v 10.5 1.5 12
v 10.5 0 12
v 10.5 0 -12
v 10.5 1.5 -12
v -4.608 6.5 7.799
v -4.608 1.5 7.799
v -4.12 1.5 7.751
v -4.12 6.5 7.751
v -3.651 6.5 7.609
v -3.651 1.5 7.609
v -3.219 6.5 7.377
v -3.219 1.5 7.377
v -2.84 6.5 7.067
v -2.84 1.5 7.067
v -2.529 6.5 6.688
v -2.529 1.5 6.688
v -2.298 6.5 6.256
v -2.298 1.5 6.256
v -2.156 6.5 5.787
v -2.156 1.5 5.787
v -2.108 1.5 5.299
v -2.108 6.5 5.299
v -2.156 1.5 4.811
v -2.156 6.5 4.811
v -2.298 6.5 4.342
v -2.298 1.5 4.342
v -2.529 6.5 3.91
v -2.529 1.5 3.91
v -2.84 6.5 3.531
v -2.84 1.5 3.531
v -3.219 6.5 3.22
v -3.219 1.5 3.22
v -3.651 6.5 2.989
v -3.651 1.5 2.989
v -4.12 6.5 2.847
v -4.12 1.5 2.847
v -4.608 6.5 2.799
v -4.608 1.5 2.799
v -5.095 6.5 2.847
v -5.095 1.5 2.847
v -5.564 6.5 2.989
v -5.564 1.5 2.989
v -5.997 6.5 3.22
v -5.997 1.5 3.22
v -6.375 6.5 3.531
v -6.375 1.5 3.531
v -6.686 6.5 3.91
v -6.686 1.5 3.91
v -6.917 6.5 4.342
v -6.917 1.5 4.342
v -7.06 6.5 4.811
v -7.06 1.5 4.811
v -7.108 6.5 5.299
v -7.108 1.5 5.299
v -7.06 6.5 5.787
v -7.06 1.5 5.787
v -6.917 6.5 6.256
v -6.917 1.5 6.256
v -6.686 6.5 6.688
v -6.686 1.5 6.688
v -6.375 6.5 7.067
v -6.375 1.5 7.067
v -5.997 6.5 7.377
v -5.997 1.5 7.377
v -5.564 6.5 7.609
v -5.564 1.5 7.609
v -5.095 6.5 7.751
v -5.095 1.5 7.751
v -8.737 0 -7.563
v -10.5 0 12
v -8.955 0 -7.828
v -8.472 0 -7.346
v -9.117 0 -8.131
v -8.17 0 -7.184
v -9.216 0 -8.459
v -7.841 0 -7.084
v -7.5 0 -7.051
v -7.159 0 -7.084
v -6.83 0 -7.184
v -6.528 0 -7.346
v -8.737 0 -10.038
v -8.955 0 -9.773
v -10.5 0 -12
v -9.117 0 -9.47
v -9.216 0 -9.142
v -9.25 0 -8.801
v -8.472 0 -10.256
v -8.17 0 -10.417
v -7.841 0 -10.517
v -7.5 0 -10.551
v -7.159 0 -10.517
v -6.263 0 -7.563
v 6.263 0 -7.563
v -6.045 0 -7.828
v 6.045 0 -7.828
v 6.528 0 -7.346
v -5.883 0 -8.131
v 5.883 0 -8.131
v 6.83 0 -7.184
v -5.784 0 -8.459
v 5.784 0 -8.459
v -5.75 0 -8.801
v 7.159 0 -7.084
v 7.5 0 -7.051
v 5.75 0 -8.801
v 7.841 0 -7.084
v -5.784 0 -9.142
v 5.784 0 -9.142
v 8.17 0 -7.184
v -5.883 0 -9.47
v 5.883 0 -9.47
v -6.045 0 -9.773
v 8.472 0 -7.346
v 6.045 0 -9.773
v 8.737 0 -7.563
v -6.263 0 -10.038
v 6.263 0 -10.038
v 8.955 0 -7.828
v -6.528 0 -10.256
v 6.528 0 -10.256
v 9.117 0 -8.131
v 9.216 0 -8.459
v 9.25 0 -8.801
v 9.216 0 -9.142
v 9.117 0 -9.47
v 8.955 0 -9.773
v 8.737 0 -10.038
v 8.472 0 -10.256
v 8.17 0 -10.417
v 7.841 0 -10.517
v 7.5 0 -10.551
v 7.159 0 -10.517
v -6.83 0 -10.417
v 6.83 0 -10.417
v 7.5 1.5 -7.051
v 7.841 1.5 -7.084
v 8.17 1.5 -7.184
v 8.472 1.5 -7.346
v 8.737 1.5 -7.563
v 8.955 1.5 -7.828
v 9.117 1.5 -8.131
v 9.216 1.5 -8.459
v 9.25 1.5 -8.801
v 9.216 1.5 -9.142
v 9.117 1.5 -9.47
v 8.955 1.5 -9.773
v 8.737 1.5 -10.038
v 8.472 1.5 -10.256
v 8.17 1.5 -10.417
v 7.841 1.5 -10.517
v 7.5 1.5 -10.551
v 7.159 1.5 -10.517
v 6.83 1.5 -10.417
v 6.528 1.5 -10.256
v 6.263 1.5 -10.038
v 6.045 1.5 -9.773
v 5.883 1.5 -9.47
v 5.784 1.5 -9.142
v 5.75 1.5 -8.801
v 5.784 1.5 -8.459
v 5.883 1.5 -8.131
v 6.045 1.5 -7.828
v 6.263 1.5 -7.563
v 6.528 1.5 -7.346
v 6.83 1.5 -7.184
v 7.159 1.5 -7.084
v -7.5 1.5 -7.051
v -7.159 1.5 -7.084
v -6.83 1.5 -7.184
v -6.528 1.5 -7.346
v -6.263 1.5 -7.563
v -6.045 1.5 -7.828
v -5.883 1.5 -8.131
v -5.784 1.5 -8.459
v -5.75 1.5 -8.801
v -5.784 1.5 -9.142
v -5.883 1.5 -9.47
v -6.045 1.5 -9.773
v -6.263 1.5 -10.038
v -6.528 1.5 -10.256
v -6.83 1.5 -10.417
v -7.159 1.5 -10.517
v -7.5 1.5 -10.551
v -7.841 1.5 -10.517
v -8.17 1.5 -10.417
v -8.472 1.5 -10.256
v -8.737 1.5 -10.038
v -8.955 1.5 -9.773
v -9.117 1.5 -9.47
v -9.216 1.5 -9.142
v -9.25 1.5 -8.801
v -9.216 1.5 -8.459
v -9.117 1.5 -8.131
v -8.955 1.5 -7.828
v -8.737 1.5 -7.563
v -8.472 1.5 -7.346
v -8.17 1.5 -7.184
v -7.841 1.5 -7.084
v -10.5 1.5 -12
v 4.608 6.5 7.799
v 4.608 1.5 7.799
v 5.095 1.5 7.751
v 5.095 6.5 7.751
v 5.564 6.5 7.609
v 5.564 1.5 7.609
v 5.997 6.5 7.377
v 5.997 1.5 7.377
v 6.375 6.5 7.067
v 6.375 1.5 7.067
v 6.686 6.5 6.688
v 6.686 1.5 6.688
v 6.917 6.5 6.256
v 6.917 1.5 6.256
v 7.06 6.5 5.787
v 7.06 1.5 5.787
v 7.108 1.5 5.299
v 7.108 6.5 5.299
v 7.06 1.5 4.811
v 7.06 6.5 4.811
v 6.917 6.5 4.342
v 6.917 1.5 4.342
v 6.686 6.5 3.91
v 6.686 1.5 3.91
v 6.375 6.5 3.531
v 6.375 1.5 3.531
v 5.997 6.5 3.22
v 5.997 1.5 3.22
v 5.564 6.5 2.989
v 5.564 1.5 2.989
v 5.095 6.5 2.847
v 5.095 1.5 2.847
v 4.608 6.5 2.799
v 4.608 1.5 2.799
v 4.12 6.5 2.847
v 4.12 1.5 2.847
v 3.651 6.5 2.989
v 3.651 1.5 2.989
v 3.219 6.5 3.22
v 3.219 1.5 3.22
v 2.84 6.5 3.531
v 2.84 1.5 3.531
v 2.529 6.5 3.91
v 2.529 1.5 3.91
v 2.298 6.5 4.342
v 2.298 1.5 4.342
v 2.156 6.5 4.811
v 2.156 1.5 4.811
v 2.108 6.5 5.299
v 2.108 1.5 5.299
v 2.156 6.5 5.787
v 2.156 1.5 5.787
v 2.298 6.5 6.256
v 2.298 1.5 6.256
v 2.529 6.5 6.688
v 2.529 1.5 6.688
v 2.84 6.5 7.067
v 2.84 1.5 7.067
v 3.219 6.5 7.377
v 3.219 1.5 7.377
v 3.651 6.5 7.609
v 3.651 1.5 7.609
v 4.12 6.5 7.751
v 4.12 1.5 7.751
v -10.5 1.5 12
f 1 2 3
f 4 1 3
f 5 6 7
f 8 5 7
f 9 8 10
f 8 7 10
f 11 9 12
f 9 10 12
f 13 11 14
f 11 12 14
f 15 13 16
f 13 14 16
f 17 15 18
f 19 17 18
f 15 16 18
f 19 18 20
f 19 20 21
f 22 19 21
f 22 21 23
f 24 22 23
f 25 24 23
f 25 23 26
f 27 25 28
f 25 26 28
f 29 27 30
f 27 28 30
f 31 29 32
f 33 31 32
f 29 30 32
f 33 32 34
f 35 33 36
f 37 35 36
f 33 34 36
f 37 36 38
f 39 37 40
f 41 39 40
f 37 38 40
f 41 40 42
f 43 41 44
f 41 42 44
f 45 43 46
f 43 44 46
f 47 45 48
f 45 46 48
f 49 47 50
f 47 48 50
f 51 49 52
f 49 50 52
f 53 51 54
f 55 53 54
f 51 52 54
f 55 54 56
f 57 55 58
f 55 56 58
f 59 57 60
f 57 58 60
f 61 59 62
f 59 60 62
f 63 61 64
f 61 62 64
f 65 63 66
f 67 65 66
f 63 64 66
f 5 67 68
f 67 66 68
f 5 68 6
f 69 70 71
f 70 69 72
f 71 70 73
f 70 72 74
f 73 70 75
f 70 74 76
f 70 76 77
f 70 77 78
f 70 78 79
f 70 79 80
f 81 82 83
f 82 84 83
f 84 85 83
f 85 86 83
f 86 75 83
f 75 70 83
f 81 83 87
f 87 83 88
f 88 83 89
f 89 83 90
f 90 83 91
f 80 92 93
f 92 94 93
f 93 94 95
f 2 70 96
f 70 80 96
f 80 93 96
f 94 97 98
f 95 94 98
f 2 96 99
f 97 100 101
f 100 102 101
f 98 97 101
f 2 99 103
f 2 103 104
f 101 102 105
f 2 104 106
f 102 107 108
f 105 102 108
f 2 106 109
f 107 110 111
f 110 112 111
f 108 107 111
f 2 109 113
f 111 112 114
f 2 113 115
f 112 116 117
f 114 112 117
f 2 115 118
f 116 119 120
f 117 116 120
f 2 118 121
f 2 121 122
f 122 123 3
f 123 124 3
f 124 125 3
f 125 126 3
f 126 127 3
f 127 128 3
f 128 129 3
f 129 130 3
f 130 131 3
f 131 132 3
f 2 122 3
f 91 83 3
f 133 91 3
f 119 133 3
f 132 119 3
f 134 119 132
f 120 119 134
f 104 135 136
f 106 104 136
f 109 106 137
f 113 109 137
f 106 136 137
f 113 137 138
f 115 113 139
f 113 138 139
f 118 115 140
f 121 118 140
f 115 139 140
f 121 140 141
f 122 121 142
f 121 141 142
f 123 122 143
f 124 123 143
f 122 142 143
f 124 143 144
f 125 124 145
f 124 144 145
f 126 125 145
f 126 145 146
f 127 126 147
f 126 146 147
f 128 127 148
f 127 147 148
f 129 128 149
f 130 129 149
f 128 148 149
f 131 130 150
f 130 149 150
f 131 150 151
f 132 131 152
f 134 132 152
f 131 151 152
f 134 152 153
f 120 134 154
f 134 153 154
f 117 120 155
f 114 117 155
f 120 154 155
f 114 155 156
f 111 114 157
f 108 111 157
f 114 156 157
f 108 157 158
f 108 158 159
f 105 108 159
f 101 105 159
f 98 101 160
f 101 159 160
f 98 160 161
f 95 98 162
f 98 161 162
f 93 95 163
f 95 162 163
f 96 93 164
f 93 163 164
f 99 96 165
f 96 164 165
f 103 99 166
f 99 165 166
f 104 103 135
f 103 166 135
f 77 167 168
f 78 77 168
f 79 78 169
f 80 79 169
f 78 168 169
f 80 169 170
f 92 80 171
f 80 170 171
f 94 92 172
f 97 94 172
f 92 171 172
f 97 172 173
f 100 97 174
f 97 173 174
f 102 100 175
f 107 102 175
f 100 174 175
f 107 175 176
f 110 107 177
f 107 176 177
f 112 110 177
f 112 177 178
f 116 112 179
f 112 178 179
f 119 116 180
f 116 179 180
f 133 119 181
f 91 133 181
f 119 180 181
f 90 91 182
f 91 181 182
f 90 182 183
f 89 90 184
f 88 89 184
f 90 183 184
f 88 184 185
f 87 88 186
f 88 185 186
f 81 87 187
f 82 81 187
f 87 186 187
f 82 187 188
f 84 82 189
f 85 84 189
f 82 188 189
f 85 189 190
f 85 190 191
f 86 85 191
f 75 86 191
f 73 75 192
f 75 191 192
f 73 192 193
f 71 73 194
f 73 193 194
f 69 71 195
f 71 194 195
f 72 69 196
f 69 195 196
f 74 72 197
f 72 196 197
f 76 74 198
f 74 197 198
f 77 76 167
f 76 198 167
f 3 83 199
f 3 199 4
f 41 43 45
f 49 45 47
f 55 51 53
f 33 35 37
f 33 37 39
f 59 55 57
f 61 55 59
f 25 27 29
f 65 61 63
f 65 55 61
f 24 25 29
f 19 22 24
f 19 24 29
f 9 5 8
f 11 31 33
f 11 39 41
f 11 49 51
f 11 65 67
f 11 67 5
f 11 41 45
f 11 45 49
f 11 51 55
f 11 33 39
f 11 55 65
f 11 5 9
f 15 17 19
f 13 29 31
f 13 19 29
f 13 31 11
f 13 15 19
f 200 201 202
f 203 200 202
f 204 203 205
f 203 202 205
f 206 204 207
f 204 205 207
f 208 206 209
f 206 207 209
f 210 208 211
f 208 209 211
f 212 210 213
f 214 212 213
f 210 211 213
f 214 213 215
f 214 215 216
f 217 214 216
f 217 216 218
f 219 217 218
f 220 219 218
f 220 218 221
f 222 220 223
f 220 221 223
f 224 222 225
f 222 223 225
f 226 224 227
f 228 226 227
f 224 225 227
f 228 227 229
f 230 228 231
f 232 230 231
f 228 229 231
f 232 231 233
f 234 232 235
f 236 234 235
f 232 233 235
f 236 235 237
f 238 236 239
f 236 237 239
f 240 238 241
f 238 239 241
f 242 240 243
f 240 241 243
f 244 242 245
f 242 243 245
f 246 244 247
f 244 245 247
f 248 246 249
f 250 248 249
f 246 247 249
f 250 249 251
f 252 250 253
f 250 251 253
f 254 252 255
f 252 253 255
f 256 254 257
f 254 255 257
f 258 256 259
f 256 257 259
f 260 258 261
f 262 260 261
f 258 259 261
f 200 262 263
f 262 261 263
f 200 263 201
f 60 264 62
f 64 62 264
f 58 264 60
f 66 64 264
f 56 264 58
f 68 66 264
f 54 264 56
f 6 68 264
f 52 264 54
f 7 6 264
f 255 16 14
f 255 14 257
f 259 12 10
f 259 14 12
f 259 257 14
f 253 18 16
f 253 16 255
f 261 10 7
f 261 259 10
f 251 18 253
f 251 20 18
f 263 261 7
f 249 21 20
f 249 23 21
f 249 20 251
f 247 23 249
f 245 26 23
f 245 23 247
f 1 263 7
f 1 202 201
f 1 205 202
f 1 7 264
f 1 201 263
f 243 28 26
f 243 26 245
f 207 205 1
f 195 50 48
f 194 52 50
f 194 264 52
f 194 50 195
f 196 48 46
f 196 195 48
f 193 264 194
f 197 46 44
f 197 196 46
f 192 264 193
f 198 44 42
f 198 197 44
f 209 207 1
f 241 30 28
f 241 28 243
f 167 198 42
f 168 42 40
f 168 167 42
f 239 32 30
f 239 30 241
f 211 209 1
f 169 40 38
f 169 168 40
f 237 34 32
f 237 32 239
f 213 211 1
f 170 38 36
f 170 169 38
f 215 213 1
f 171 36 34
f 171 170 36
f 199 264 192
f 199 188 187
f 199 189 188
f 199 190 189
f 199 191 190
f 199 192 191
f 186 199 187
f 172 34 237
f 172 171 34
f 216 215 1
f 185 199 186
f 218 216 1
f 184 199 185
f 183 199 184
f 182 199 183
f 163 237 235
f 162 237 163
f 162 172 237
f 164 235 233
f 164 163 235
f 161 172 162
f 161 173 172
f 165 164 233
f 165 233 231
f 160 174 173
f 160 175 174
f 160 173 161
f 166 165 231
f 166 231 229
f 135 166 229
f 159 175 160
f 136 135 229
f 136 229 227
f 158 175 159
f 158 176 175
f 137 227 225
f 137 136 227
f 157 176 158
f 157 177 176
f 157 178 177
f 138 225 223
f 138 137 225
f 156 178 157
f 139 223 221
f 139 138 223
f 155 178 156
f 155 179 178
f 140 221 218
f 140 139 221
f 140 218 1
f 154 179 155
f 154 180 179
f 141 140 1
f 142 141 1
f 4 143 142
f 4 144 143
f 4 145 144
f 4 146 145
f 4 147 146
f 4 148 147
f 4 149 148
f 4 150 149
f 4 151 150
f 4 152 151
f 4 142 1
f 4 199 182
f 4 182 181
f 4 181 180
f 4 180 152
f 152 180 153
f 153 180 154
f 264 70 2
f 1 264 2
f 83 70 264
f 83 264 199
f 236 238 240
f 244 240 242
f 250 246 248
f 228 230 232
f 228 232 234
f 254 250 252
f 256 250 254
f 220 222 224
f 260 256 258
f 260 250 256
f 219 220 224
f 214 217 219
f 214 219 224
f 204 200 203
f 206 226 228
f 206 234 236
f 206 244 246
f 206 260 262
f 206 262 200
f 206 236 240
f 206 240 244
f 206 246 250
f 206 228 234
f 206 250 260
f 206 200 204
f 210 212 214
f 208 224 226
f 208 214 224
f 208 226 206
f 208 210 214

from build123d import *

# Parameters (mm, degrees)
SKETCH_1_W          = 21
SKETCH_1_H          = 24
EXTRUDE_1_DEPTH     = 1.5
SKETCH_2_R          = 1.75
CUT_EXTRUDE_1_DEPTH = 1.5
SKETCH_3_R          = 2.5
EXTRUDE_2_DEPTH     = 5


with BuildPart() as part:
    # 草图1 → 凸台-拉伸1 (new body)
    with BuildSketch(Plane(origin=(0, 0, 0), x_dir=(1, 0, 0), z_dir=(0, 1, 0))):
        Rectangle(SKETCH_1_W, SKETCH_1_H)
    extrude(amount=EXTRUDE_1_DEPTH)

    # 草图2 → 切除-拉伸1 (cut)
    with BuildSketch(Plane(origin=(0, 1.5, 0), x_dir=(1, 0, 0), z_dir=(0, 1, 0))):
        with Locations(Location((-7.5, 8.800641953, 0), (0, 0, 270))):
            Circle(SKETCH_2_R)
        with Locations(Location((7.5, 8.800641953, 0), (0, 0, 270))):
            Circle(SKETCH_2_R)
    extrude(amount=-CUT_EXTRUDE_1_DEPTH, mode=Mode.SUBTRACT)

    # 草图3 → 凸台-拉伸2 (add)
    with BuildSketch(Plane(origin=(0, 1.5, 0), x_dir=(1, 0, 0), z_dir=(0, 1, 0))):
        with Locations(Location((-4.607665944, -5.298815836, 0), (0, 0, 270))):
            Circle(SKETCH_3_R)
        with Locations(Location((4.607665944, -5.298815836, 0), (0, 0, 270))):
            Circle(SKETCH_3_R)
    extrude(amount=EXTRUDE_2_DEPTH)


solid = part.part
